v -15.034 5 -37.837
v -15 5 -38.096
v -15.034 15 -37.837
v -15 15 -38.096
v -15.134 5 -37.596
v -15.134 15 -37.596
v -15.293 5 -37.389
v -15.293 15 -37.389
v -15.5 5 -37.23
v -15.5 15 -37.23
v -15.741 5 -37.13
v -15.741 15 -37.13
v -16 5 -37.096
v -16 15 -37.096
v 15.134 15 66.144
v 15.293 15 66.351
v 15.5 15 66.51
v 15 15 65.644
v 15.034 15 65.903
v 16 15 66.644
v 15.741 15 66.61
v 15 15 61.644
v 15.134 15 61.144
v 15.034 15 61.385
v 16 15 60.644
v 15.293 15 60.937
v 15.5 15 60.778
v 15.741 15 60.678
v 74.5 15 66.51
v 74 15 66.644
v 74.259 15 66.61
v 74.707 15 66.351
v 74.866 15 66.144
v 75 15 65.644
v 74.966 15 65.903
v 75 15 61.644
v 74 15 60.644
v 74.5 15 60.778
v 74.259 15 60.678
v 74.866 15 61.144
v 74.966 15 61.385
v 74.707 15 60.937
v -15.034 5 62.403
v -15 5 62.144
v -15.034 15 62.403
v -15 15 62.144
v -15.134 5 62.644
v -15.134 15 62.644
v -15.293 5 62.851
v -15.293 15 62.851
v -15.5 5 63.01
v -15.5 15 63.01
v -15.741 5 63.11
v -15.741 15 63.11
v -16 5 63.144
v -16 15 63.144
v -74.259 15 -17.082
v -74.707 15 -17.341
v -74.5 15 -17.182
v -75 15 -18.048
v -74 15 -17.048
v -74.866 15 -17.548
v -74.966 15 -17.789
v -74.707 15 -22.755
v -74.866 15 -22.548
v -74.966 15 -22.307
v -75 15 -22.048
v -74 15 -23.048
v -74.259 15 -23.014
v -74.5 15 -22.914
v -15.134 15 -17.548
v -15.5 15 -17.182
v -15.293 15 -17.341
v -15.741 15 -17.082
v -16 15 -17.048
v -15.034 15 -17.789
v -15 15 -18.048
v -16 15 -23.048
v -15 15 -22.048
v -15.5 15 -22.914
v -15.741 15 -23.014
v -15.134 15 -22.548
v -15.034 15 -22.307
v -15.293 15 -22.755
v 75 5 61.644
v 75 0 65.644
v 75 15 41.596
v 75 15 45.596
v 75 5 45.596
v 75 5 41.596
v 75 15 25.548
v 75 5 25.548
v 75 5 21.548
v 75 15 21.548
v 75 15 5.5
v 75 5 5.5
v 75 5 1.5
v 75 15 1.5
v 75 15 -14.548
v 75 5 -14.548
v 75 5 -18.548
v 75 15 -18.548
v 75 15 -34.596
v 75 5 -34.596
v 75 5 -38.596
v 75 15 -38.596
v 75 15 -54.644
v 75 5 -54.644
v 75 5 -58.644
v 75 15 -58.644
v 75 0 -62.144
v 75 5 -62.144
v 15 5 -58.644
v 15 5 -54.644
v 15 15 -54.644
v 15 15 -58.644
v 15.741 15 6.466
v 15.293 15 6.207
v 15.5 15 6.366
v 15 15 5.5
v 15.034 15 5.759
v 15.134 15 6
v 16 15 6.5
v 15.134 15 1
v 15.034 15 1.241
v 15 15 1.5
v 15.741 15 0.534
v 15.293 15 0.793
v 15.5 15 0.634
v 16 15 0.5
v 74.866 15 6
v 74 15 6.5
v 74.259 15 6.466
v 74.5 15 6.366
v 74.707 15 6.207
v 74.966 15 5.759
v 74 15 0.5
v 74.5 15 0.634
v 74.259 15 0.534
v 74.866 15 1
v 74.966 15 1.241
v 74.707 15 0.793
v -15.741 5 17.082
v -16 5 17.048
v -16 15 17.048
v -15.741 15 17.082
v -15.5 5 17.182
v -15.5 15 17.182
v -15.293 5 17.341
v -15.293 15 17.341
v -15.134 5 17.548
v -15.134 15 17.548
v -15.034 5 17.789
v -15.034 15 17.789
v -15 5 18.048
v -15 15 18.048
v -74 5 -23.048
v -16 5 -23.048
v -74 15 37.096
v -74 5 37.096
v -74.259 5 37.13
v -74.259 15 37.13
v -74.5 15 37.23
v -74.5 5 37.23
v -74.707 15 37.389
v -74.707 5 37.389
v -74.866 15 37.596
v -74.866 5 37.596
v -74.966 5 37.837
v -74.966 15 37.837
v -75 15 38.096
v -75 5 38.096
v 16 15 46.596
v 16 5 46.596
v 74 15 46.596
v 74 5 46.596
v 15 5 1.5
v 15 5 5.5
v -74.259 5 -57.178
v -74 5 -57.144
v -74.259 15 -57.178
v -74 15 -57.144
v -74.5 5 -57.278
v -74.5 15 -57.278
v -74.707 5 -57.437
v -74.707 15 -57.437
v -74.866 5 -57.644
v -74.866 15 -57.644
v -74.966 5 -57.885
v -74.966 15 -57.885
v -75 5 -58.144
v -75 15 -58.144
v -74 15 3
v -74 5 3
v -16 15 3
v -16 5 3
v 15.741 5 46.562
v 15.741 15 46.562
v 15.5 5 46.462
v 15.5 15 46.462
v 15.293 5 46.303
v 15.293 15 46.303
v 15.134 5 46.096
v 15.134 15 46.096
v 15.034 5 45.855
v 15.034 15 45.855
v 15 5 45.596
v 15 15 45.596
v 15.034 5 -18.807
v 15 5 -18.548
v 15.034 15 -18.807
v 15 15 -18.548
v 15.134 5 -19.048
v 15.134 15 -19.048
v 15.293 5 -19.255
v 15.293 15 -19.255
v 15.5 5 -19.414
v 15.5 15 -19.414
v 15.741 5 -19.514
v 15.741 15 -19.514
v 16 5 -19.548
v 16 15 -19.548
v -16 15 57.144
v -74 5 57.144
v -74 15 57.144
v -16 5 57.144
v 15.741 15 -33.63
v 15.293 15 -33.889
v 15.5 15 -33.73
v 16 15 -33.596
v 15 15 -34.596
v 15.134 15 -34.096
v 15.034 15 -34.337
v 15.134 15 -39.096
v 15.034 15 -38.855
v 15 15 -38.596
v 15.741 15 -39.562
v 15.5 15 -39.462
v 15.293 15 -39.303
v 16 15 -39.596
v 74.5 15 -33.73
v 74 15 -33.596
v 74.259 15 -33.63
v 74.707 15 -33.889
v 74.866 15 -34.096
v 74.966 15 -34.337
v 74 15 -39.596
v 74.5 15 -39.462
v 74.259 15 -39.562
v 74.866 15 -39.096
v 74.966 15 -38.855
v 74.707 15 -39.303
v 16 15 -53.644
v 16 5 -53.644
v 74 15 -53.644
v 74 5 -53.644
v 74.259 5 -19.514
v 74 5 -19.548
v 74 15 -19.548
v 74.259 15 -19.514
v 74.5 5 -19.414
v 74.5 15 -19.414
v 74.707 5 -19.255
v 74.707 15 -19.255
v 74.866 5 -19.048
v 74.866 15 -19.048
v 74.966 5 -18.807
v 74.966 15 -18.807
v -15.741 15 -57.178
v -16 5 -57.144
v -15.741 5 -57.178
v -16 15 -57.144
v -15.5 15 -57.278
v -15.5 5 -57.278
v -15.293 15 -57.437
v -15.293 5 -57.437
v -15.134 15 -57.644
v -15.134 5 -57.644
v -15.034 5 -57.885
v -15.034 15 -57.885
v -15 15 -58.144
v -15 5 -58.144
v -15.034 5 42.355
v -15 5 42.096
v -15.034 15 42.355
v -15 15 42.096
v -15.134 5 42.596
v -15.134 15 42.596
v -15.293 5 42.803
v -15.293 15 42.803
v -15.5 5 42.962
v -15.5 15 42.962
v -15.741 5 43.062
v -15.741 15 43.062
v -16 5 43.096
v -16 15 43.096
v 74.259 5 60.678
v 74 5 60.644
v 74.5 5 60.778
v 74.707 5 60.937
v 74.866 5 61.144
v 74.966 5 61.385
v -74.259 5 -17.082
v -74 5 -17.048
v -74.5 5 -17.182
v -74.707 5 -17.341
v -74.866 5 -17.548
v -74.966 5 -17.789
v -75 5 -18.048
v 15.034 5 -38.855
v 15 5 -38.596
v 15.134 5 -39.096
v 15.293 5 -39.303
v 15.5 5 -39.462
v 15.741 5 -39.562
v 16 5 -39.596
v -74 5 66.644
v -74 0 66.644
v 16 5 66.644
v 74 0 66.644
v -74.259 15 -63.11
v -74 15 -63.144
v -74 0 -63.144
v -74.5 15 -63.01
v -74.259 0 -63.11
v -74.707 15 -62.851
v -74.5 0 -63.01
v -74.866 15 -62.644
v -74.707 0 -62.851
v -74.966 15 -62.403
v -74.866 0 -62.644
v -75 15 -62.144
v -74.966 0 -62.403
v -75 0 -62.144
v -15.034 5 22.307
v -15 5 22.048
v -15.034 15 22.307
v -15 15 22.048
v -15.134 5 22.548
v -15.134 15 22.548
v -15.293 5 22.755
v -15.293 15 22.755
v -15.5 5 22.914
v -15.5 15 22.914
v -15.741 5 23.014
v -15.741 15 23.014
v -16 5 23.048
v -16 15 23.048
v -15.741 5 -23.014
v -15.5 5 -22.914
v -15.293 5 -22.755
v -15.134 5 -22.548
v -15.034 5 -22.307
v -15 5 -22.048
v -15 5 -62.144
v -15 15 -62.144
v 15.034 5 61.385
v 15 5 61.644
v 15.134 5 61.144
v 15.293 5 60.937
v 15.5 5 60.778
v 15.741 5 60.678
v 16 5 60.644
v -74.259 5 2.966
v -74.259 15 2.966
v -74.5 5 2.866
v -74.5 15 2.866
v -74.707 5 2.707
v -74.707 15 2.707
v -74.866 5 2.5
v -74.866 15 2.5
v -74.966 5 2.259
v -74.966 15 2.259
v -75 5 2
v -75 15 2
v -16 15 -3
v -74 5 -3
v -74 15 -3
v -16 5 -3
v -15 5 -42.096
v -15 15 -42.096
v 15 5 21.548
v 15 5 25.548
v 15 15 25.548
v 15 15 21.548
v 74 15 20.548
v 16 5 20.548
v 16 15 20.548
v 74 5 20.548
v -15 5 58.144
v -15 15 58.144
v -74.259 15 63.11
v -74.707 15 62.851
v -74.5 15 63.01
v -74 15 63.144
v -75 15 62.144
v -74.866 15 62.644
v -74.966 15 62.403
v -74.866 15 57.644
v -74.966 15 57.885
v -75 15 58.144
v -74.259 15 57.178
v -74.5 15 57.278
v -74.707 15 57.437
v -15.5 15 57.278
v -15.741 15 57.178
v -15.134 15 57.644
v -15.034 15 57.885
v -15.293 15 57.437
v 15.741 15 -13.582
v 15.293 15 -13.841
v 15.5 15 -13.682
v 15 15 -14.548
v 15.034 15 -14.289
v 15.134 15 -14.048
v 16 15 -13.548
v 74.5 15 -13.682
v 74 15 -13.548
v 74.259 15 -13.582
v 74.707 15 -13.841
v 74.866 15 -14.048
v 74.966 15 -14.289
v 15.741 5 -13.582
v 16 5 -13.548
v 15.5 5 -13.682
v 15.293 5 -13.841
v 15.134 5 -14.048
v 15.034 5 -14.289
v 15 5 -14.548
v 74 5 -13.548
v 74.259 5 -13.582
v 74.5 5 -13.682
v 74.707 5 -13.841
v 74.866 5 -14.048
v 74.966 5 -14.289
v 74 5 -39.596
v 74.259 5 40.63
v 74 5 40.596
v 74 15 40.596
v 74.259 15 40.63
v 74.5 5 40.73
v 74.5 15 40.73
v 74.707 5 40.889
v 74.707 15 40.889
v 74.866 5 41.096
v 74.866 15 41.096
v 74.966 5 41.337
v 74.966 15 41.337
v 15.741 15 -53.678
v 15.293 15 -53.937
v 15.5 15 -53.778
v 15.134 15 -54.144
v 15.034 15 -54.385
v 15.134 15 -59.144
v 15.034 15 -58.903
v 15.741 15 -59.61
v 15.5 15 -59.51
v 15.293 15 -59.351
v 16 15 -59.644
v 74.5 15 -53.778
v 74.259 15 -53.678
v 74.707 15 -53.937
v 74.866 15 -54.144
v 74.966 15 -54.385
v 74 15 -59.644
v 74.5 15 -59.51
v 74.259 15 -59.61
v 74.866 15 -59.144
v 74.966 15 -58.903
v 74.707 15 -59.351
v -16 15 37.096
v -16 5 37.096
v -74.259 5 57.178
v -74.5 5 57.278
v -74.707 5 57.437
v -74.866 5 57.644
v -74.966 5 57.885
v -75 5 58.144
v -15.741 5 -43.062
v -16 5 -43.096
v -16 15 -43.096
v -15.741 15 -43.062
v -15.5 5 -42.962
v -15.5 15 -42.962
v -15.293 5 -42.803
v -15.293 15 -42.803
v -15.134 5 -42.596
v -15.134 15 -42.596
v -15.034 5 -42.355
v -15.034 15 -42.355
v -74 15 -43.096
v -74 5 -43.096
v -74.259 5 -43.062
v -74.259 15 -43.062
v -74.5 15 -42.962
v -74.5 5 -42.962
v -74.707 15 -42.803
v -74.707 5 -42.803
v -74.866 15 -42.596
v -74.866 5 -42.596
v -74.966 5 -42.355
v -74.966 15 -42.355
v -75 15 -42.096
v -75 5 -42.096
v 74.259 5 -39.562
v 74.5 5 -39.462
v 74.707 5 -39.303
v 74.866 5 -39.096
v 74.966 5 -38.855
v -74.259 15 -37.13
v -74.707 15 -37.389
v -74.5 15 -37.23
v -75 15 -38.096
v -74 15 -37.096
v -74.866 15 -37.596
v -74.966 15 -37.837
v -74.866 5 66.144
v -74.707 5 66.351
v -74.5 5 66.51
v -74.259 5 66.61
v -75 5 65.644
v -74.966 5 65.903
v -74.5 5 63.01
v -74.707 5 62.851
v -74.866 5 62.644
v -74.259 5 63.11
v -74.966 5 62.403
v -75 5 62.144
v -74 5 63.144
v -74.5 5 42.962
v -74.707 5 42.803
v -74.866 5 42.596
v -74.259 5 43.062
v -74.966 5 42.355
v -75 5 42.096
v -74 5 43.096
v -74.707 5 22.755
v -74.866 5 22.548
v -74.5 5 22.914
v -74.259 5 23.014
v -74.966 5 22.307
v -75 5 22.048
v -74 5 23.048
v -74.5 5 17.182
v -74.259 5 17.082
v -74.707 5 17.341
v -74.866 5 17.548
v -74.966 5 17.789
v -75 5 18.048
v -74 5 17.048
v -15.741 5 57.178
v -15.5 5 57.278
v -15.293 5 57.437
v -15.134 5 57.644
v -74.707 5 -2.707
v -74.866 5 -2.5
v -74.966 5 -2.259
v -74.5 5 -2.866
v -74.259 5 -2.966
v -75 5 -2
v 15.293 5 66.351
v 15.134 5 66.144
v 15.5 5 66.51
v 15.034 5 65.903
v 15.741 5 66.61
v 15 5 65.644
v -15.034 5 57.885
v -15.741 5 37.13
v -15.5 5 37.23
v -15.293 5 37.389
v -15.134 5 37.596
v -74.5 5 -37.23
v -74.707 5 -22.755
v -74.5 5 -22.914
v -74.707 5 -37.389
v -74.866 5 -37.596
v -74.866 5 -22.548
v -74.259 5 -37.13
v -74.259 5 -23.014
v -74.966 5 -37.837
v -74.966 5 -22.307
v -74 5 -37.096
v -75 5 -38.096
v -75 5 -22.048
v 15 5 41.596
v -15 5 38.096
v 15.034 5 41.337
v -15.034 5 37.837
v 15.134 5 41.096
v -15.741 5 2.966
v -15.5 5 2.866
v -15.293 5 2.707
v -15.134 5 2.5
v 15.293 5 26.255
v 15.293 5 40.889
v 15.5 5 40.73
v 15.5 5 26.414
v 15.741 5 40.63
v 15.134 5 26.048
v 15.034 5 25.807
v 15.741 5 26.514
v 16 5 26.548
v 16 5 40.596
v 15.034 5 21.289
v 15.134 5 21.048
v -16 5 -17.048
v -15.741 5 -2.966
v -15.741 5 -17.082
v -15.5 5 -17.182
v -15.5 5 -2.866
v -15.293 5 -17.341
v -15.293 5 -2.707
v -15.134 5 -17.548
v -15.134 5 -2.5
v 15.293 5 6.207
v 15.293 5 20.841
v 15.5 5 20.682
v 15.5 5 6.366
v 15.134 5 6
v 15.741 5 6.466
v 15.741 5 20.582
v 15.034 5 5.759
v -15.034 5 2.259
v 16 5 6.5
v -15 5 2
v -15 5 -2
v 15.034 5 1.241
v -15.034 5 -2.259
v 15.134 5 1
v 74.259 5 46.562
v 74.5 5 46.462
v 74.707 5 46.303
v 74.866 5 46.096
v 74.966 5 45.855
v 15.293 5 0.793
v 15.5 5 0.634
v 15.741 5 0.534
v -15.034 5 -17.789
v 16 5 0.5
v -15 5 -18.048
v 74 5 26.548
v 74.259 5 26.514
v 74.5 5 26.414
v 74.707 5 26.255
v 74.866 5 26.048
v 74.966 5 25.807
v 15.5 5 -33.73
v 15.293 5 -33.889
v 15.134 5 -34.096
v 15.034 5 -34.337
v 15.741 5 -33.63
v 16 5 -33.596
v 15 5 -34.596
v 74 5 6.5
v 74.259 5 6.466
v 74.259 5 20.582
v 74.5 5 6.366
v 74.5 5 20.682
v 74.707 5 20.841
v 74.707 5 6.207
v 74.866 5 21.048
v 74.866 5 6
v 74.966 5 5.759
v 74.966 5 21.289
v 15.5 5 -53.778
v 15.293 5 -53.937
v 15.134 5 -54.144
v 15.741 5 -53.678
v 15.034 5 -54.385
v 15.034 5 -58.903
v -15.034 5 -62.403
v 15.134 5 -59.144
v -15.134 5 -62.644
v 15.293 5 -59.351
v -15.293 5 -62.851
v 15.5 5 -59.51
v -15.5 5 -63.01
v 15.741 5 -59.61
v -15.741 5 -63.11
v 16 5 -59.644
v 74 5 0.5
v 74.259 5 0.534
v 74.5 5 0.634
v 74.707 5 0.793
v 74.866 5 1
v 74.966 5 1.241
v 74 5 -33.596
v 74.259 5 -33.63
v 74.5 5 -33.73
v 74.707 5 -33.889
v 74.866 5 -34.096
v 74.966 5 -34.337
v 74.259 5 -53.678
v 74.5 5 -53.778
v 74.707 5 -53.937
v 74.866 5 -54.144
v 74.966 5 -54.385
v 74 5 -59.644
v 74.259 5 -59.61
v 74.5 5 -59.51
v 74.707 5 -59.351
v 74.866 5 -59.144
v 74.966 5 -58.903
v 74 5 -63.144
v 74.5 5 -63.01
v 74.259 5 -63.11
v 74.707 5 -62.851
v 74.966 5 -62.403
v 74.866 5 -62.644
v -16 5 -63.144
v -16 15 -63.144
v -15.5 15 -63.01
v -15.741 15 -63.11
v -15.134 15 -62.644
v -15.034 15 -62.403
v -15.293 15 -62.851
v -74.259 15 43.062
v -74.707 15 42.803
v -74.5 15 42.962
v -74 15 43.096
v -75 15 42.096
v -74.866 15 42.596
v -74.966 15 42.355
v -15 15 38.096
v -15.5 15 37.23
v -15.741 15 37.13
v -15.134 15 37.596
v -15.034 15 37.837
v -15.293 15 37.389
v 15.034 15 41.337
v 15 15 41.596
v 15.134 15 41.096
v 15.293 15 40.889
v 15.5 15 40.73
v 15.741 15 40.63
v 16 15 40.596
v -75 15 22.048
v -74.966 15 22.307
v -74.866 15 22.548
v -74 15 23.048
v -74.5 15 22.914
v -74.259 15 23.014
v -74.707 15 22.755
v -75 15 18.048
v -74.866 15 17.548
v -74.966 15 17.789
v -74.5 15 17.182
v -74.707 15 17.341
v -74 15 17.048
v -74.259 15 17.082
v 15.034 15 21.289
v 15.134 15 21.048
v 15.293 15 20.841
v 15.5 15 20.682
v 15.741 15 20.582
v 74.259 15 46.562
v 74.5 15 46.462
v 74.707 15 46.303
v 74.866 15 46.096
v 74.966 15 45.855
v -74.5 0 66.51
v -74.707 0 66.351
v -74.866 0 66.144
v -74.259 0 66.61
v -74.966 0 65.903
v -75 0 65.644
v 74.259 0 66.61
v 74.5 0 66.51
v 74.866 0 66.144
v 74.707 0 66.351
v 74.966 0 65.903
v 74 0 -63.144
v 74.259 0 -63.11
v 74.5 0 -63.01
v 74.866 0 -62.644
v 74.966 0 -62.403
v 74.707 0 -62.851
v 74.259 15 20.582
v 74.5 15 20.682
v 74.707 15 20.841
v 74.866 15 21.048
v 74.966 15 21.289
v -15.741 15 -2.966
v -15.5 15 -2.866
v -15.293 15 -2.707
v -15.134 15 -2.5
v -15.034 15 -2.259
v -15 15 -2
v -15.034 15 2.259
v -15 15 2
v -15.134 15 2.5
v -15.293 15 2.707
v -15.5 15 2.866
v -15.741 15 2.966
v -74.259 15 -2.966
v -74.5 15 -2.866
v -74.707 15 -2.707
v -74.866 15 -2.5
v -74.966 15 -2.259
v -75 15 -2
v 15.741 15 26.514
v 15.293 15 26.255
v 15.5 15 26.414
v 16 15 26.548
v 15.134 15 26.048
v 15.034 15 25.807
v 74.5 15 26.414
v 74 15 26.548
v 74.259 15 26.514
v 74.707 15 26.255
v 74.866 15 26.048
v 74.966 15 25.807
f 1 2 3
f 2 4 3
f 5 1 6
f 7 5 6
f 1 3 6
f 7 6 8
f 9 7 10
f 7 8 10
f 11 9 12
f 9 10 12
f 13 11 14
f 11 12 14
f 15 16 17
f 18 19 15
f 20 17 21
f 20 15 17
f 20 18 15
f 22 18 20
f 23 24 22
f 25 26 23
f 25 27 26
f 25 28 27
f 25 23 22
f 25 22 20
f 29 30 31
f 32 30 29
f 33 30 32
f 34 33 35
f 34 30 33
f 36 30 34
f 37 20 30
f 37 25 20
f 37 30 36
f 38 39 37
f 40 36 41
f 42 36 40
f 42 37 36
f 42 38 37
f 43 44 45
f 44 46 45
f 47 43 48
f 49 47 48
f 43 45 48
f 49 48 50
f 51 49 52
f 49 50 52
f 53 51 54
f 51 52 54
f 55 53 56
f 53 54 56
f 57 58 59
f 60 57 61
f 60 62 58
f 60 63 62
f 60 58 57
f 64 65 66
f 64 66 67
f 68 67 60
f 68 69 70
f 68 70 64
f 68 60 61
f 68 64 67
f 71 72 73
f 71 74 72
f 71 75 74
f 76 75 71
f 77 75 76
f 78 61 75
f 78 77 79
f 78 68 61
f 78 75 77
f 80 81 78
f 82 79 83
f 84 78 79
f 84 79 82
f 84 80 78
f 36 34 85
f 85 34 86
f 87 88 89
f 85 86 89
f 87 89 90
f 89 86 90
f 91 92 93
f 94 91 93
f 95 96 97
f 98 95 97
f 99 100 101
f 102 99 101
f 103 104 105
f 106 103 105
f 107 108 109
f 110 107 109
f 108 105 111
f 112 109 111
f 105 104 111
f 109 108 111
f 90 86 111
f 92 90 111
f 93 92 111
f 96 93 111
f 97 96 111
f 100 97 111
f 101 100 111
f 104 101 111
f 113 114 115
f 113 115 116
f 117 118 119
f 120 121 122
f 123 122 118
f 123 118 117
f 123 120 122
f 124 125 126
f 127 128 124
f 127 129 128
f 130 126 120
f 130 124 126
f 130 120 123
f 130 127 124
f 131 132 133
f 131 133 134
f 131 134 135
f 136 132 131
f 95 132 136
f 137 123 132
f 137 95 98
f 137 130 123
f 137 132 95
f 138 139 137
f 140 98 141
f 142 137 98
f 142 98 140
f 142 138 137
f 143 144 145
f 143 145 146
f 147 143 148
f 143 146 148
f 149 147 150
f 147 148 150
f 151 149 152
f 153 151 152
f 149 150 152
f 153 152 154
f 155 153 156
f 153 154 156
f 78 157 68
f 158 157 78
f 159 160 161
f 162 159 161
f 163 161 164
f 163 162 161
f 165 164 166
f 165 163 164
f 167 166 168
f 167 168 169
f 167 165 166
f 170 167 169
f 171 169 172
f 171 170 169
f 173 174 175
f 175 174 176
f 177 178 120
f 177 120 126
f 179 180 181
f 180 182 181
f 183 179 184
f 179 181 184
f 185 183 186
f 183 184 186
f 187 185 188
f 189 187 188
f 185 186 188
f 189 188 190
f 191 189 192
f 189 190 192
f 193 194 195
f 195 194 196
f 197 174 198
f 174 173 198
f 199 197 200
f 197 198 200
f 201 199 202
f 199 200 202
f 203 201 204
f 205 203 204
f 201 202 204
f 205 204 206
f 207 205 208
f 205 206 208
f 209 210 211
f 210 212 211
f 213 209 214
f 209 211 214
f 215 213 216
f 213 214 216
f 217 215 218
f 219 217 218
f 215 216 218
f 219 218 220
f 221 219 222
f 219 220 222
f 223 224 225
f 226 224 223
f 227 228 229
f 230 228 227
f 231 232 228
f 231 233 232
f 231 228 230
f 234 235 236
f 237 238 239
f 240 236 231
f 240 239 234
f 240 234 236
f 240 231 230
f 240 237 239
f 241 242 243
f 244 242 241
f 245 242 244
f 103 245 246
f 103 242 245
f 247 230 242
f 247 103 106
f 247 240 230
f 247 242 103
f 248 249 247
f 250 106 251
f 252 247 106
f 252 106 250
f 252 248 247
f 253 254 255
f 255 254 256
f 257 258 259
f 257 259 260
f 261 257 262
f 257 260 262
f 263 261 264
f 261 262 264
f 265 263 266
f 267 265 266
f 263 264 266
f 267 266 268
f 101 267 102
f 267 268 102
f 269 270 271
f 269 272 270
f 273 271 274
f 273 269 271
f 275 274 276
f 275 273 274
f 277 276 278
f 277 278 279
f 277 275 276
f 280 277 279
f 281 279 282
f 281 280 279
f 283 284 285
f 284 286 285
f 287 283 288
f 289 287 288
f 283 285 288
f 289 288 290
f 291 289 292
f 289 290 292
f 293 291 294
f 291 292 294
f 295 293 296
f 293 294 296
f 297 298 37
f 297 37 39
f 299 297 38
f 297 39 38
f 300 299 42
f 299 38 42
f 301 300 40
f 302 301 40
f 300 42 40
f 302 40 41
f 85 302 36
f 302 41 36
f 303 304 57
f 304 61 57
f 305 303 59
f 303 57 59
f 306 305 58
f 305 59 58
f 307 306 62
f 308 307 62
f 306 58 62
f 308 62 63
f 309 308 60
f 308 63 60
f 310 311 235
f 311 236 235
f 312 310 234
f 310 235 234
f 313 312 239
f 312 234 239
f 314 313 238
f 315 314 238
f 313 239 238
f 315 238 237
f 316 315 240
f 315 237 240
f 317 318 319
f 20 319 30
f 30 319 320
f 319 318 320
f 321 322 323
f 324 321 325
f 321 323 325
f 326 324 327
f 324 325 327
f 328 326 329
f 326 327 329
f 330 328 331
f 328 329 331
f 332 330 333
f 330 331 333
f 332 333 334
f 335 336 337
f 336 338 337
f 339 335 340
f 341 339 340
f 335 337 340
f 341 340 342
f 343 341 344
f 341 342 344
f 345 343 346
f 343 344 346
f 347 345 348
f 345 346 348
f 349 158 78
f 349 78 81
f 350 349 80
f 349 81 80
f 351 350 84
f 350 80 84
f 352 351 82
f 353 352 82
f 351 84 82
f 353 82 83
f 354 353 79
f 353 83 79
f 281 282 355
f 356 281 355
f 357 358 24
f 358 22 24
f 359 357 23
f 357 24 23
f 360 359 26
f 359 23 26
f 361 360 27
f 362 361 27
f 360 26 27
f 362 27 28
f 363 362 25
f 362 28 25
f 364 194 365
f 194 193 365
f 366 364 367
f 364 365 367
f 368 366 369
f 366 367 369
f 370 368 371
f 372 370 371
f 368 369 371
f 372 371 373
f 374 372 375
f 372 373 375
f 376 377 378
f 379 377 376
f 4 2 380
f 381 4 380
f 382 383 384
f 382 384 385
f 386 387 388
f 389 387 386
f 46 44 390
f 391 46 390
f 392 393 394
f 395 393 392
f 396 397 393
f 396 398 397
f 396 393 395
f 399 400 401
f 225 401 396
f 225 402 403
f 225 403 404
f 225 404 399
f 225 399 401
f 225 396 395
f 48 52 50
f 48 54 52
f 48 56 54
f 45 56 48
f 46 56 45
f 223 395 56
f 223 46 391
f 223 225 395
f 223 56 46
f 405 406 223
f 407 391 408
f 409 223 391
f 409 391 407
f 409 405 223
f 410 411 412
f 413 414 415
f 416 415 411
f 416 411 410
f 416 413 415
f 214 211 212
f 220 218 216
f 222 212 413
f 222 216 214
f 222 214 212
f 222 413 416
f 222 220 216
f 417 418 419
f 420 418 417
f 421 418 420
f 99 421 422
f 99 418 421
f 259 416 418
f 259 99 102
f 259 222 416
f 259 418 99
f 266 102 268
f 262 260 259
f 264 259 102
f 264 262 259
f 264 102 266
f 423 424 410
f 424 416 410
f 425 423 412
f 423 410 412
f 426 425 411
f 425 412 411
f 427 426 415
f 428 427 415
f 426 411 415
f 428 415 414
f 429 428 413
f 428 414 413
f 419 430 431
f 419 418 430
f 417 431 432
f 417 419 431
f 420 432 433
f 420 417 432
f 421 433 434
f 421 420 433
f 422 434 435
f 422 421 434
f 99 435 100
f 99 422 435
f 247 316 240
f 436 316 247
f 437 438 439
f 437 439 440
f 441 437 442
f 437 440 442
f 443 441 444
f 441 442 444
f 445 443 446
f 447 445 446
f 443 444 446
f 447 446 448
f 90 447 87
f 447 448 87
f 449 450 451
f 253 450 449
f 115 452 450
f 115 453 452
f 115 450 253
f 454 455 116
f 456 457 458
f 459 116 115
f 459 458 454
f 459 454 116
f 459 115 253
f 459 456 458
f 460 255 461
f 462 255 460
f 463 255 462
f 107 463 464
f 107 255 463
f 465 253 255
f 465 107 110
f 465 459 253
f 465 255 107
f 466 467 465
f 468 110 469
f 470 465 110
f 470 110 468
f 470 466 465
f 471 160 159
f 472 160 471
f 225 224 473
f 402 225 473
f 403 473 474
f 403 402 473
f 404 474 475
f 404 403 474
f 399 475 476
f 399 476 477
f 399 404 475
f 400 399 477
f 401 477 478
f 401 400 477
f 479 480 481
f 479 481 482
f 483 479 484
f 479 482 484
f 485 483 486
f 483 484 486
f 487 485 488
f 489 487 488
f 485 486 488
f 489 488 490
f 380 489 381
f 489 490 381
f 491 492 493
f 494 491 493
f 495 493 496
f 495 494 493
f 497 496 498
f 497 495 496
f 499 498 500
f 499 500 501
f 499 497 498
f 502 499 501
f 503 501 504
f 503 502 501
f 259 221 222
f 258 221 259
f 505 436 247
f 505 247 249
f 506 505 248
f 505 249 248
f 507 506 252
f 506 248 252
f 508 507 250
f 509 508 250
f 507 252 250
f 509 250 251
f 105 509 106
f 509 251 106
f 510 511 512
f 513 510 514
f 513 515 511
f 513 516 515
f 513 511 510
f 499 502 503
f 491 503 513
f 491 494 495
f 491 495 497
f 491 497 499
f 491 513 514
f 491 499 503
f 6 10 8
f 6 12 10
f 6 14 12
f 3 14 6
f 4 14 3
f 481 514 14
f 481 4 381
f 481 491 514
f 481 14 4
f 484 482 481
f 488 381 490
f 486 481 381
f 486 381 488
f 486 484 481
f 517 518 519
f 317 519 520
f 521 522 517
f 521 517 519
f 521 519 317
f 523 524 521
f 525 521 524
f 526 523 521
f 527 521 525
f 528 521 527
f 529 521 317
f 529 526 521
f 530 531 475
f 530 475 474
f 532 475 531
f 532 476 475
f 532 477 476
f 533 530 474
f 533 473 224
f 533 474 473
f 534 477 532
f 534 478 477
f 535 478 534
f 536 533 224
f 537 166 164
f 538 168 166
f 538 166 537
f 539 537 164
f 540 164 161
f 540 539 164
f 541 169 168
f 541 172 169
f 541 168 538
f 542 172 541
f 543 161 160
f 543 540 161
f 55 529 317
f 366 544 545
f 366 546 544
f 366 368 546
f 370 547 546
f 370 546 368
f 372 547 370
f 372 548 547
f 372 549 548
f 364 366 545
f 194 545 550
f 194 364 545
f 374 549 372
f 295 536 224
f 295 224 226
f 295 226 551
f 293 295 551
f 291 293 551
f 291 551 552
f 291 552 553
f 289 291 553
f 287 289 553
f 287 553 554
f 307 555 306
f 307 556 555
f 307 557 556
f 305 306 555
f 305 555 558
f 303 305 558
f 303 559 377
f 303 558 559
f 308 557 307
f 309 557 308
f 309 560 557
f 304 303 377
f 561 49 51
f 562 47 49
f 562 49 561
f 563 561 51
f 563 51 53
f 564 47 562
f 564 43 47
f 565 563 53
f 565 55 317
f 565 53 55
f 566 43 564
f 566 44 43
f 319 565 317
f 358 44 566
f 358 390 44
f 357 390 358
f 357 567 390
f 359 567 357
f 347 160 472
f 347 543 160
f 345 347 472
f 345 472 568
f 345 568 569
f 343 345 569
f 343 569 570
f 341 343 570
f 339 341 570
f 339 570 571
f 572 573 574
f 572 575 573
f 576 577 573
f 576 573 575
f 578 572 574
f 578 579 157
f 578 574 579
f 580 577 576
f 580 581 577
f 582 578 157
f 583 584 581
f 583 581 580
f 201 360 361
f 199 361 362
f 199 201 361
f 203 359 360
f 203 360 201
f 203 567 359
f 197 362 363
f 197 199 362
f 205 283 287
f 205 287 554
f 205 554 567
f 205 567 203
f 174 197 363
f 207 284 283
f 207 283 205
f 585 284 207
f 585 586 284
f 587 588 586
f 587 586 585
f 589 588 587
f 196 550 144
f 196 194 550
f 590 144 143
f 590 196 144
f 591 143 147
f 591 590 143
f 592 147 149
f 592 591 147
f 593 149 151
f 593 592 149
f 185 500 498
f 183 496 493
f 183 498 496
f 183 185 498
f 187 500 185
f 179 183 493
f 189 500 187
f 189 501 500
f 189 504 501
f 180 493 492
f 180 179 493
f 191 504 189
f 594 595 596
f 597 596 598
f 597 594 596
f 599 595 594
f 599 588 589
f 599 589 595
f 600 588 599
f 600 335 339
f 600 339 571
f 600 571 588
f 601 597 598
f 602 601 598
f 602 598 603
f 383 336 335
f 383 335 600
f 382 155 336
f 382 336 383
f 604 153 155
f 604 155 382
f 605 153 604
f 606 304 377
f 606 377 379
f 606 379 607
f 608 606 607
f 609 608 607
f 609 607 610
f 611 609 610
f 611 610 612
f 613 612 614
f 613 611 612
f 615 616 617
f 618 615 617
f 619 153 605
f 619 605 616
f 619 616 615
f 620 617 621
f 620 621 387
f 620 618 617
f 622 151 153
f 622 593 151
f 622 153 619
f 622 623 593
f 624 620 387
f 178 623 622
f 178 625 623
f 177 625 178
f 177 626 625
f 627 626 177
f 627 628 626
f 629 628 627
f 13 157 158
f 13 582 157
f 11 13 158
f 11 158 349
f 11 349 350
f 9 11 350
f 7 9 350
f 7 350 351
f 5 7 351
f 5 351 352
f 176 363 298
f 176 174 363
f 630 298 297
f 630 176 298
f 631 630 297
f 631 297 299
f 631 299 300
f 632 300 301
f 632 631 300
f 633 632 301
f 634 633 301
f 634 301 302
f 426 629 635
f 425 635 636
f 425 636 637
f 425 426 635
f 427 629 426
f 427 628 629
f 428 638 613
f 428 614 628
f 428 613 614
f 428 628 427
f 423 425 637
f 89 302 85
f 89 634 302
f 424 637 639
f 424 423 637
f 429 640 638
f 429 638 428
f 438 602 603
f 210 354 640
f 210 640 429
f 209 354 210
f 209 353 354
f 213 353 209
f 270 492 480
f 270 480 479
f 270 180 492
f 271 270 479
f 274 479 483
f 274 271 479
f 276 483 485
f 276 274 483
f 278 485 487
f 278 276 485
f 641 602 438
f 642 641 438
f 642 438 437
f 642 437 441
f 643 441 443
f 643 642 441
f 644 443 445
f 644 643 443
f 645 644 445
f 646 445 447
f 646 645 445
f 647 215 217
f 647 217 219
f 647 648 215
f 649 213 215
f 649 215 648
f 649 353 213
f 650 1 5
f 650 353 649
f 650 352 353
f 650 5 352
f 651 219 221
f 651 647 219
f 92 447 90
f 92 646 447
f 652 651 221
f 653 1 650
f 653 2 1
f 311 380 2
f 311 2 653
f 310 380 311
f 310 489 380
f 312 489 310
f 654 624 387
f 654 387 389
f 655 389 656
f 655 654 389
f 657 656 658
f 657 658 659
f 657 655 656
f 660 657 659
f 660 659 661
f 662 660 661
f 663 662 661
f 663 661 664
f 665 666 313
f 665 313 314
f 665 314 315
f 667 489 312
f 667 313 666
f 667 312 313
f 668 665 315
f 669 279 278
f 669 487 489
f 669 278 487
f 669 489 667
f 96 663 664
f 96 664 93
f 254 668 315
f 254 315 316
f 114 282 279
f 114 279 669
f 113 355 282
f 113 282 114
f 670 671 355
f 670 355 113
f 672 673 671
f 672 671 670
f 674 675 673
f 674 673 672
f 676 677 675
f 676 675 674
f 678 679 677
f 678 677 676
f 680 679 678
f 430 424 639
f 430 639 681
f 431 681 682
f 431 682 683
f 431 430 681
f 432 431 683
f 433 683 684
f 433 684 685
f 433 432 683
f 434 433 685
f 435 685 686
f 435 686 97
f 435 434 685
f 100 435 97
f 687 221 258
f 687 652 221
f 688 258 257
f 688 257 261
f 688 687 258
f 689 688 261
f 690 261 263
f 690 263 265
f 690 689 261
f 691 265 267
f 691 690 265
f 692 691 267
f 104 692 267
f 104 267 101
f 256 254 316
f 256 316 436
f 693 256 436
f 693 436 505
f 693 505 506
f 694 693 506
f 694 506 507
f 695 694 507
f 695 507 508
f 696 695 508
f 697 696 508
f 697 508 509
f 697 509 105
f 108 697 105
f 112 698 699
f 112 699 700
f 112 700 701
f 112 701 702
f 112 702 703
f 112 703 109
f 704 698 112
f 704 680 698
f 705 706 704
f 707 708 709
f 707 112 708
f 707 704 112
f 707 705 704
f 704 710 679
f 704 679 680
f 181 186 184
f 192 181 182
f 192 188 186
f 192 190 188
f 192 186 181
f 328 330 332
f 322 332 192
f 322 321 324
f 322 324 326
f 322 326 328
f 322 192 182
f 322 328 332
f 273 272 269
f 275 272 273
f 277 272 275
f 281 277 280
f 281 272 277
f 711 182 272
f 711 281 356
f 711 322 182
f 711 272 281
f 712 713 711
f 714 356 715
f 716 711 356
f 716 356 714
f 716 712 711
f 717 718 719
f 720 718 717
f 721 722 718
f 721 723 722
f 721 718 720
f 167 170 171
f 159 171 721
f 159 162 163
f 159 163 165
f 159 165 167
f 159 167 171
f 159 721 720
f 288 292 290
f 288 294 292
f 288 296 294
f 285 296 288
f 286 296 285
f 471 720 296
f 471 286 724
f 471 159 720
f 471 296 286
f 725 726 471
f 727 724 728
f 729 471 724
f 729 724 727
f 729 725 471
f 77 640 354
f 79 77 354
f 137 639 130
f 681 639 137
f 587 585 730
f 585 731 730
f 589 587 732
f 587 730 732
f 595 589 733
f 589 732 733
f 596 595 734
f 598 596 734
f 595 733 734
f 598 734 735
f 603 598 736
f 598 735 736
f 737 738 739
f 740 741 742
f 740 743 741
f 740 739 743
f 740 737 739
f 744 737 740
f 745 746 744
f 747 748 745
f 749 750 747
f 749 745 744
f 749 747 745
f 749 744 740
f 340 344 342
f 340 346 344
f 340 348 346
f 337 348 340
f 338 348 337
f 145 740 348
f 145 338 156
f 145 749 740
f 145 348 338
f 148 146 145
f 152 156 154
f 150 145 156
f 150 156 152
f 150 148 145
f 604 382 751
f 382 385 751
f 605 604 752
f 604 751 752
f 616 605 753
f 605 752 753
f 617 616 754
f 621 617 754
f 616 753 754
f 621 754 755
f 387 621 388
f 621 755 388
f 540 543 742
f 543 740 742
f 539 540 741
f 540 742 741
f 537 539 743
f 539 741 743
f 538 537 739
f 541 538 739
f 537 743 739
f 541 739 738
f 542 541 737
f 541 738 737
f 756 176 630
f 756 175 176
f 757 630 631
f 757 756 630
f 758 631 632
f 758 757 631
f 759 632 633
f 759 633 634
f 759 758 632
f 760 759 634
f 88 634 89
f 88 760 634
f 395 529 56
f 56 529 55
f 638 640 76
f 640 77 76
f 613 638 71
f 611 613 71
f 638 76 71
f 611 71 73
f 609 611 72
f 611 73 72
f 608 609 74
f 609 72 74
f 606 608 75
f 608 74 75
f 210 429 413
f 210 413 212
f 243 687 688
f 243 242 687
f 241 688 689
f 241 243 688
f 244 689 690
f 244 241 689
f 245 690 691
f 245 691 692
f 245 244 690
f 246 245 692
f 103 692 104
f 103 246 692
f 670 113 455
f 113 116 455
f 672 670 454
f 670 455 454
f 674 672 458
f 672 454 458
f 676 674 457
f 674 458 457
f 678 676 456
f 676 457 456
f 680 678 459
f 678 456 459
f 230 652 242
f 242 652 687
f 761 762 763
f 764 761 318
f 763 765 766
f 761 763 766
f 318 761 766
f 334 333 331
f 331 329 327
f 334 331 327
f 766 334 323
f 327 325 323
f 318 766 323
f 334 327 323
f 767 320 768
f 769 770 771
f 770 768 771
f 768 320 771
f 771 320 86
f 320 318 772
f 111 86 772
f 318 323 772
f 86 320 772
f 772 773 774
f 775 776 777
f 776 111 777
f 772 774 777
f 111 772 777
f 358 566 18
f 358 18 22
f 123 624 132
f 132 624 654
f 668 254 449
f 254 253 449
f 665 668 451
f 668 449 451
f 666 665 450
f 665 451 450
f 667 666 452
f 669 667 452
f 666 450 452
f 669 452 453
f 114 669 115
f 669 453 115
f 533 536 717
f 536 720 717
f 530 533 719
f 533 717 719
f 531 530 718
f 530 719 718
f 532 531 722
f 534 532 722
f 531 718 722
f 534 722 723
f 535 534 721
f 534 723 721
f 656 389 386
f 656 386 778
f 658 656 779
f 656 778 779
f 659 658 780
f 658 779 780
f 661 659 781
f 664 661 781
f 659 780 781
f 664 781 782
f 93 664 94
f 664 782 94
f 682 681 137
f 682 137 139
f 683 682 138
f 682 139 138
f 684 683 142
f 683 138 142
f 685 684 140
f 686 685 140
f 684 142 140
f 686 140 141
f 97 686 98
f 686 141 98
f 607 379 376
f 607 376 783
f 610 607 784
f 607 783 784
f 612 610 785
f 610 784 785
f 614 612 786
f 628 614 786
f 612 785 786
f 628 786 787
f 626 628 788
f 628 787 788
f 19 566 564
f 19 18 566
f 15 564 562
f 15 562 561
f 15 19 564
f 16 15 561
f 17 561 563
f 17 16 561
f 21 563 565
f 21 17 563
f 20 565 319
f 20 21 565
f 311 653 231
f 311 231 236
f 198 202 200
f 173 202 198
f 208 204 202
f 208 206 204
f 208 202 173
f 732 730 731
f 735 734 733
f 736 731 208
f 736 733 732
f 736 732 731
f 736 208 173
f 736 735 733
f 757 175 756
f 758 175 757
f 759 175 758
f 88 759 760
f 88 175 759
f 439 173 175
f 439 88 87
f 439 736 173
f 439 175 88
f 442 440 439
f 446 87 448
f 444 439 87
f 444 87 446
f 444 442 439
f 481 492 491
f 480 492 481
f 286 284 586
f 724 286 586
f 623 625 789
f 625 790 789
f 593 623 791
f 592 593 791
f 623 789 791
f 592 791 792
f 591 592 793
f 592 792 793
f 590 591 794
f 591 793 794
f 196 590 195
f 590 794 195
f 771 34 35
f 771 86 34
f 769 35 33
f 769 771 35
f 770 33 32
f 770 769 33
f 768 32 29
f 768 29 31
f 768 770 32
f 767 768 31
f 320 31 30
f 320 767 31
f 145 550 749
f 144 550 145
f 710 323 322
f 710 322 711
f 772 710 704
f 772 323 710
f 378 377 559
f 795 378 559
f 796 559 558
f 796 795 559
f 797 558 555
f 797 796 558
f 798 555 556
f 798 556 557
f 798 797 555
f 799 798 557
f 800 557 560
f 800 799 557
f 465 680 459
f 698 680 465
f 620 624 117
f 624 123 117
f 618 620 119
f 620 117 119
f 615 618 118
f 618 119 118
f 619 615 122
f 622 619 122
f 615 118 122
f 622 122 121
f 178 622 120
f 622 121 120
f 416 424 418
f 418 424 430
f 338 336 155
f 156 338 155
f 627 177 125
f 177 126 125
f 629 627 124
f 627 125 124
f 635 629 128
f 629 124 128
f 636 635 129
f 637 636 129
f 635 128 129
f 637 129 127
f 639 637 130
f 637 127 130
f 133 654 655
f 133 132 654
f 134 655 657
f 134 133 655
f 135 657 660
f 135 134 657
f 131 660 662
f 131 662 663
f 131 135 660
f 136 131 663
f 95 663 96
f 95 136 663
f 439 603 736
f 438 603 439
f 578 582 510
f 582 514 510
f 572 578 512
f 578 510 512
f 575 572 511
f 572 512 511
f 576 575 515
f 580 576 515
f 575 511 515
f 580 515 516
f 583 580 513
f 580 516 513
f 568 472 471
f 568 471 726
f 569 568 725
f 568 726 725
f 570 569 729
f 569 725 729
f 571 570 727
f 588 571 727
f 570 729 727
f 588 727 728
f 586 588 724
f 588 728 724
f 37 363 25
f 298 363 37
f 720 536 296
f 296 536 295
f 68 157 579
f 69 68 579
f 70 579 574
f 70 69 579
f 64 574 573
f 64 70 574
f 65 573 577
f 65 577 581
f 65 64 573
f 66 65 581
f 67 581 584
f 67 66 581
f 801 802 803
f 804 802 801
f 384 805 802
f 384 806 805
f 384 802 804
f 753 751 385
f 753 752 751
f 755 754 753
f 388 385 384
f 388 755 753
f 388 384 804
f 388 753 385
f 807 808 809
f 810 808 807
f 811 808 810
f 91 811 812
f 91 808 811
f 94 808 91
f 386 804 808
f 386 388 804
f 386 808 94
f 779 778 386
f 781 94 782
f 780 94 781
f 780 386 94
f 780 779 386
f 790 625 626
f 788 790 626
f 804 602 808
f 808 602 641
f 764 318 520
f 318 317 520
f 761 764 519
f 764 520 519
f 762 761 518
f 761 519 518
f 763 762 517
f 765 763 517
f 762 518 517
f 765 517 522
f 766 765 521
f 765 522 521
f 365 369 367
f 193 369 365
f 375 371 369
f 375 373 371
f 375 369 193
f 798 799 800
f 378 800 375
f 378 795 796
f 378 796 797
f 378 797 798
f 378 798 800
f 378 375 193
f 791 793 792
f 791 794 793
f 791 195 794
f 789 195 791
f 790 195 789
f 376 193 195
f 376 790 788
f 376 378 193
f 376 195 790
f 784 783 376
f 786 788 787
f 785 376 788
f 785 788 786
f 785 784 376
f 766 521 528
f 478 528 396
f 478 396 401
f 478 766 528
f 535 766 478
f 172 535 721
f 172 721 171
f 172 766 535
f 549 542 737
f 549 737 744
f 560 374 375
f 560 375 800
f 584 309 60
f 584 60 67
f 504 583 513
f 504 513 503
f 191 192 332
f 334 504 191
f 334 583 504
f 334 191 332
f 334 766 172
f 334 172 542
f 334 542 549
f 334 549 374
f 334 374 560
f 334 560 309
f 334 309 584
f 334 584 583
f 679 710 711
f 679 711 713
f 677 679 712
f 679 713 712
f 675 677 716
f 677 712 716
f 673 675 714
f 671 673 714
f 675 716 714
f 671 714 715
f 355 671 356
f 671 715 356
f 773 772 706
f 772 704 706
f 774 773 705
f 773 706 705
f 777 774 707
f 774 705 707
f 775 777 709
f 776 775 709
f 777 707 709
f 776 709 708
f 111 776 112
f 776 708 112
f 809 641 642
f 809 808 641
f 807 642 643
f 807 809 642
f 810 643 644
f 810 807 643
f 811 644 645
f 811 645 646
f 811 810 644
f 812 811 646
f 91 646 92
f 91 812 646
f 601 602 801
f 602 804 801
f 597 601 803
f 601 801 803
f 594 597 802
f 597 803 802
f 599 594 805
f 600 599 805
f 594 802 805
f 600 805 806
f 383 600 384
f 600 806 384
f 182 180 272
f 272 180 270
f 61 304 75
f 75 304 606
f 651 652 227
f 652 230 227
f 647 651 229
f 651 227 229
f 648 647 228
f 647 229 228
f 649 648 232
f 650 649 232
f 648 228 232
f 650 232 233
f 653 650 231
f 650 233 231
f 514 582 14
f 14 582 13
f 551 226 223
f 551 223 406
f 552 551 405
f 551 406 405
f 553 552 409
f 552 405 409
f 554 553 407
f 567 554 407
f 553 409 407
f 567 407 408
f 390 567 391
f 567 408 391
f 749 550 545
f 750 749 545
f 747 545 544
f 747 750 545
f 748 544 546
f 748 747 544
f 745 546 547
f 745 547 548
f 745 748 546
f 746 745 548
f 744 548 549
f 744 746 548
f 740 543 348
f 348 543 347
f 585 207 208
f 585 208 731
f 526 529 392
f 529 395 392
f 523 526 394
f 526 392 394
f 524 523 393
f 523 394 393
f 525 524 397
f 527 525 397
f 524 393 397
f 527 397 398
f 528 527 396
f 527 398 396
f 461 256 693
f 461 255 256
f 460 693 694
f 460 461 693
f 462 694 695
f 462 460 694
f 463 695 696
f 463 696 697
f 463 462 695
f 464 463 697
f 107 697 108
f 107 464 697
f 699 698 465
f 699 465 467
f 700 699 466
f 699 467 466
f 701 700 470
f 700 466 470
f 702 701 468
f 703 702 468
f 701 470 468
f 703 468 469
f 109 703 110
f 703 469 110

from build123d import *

# Parameters (mm, degrees)
SKETCH1_W           = 150
SKETCH1_H           = 129.788
BOSS_EXTRUDE1_DEPTH = 5
SKETCH1_3_W         = 60
SKETCH1_3_H         = 6
BOSS_EXTRUDE2_DEPTH = 15
FILLET1_R           = 1


with BuildPart() as part:
    # Sketch1 → Boss-Extrude1 (new body)
    with BuildSketch(Plane(origin=(0, 0, 0), x_dir=(1, 0, 0), z_dir=(0, 1, 0))):
        with Locations((0, -1.75)):
            Rectangle(SKETCH1_W, SKETCH1_H)
    extrude(amount=BOSS_EXTRUDE1_DEPTH)

    # Sketch1_3 → Boss-Extrude2 (add)
    with BuildSketch(Plane(origin=(0, 0, 0), x_dir=(1, 0, 0), z_dir=(0, 1, 0))):
        with Locations((-45, 60.144)):
            Rectangle(SKETCH1_3_W, SKETCH1_3_H)
        with Locations((-45, 40.096)):
            Rectangle(SKETCH1_3_W, SKETCH1_3_H)
        with Locations((-45, 20.048)):
            Rectangle(SKETCH1_3_W, SKETCH1_3_H)
        with Locations((-45, 0)):
            Rectangle(SKETCH1_3_W, SKETCH1_3_H)
        with Locations((45, 56.644)):
            Rectangle(SKETCH1_3_W, SKETCH1_3_H)
        with Locations((45, 36.596)):
            Rectangle(SKETCH1_3_W, SKETCH1_3_H)
        with Locations((45, 16.548)):
            Rectangle(SKETCH1_3_W, SKETCH1_3_H)
        with Locations((45, -3.5)):
            Rectangle(SKETCH1_3_W, SKETCH1_3_H)
        with Locations((-45, -20.048)):
            Rectangle(SKETCH1_3_W, SKETCH1_3_H)
        with Locations((-45, -40.096)):
            Rectangle(SKETCH1_3_W, SKETCH1_3_H)
        with Locations((-45, -60.144)):
            Rectangle(SKETCH1_3_W, SKETCH1_3_H)
        with Locations((45, -23.548)):
            Rectangle(SKETCH1_3_W, SKETCH1_3_H)
        with Locations((45, -43.596)):
            Rectangle(SKETCH1_3_W, SKETCH1_3_H)
        with Locations((45, -63.644)):
            Rectangle(SKETCH1_3_W, SKETCH1_3_H)
    extrude(amount=BOSS_EXTRUDE2_DEPTH)

    # Fillet1
    fillet1_edges = [part.edges().sort_by_distance(p)[0] for p in [
        (-15, 10, -3),
        (-75, 10, -3),
        (-75, 10, 3),
        (-15, 10, 3),
        (-15, 10, -23.048),
        (-75, 10, -23.048),
        (-75, 10, -17.048),
        (-15, 10, -17.048),
        (75, 2.5, -63.144),
        (75, 7.5, 66.644),
        (-75, 2.5, 66.644),
        (-75, 7.5, -63.144),
        (-15, 10, -43.096),
        (-75, 10, -43.096),
        (-75, 10, -37.096),
        (-15, 10, -37.096),
        (-75, 10, -57.144),
        (-15, 10, -57.144),
        (-15, 10, -63.144),
        (75, 10, -59.644),
        (15, 10, -59.644),
        (15, 10, -53.644),
        (75, 10, -53.644),
        (75, 10, -39.596),
        (15, 10, -39.596),
        (15, 10, -33.596),
        (75, 10, -33.596),
        (75, 10, -19.548),
        (15, 10, -19.548),
        (15, 10, -13.548),
        (75, 10, -13.548),
        (75, 10, 0.5),
        (15, 10, 0.5),
        (15, 10, 6.5),
        (75, 10, 6.5),
        (75, 10, 20.548),
        (15, 10, 20.548),
        (15, 10, 26.548),
        (75, 10, 26.548),
        (75, 10, 40.596),
        (15, 10, 40.596),
        (15, 10, 46.596),
        (75, 10, 46.596),
        (75, 10, 60.644),
        (15, 10, 60.644),
        (15, 10, 66.644),
        (-15, 10, 57.144),
        (-75, 10, 57.144),
        (-75, 10, 63.144),
        (-15, 10, 63.144),
        (-15, 10, 37.096),
        (-75, 10, 37.096),
        (-75, 10, 43.096),
        (-15, 10, 43.096),
        (-15, 10, 17.048),
        (-75, 10, 17.048),
        (-75, 10, 23.048),
        (-15, 10, 23.048),
    ]]
    fillet(fillet1_edges, radius=FILLET1_R)


solid = part.part
